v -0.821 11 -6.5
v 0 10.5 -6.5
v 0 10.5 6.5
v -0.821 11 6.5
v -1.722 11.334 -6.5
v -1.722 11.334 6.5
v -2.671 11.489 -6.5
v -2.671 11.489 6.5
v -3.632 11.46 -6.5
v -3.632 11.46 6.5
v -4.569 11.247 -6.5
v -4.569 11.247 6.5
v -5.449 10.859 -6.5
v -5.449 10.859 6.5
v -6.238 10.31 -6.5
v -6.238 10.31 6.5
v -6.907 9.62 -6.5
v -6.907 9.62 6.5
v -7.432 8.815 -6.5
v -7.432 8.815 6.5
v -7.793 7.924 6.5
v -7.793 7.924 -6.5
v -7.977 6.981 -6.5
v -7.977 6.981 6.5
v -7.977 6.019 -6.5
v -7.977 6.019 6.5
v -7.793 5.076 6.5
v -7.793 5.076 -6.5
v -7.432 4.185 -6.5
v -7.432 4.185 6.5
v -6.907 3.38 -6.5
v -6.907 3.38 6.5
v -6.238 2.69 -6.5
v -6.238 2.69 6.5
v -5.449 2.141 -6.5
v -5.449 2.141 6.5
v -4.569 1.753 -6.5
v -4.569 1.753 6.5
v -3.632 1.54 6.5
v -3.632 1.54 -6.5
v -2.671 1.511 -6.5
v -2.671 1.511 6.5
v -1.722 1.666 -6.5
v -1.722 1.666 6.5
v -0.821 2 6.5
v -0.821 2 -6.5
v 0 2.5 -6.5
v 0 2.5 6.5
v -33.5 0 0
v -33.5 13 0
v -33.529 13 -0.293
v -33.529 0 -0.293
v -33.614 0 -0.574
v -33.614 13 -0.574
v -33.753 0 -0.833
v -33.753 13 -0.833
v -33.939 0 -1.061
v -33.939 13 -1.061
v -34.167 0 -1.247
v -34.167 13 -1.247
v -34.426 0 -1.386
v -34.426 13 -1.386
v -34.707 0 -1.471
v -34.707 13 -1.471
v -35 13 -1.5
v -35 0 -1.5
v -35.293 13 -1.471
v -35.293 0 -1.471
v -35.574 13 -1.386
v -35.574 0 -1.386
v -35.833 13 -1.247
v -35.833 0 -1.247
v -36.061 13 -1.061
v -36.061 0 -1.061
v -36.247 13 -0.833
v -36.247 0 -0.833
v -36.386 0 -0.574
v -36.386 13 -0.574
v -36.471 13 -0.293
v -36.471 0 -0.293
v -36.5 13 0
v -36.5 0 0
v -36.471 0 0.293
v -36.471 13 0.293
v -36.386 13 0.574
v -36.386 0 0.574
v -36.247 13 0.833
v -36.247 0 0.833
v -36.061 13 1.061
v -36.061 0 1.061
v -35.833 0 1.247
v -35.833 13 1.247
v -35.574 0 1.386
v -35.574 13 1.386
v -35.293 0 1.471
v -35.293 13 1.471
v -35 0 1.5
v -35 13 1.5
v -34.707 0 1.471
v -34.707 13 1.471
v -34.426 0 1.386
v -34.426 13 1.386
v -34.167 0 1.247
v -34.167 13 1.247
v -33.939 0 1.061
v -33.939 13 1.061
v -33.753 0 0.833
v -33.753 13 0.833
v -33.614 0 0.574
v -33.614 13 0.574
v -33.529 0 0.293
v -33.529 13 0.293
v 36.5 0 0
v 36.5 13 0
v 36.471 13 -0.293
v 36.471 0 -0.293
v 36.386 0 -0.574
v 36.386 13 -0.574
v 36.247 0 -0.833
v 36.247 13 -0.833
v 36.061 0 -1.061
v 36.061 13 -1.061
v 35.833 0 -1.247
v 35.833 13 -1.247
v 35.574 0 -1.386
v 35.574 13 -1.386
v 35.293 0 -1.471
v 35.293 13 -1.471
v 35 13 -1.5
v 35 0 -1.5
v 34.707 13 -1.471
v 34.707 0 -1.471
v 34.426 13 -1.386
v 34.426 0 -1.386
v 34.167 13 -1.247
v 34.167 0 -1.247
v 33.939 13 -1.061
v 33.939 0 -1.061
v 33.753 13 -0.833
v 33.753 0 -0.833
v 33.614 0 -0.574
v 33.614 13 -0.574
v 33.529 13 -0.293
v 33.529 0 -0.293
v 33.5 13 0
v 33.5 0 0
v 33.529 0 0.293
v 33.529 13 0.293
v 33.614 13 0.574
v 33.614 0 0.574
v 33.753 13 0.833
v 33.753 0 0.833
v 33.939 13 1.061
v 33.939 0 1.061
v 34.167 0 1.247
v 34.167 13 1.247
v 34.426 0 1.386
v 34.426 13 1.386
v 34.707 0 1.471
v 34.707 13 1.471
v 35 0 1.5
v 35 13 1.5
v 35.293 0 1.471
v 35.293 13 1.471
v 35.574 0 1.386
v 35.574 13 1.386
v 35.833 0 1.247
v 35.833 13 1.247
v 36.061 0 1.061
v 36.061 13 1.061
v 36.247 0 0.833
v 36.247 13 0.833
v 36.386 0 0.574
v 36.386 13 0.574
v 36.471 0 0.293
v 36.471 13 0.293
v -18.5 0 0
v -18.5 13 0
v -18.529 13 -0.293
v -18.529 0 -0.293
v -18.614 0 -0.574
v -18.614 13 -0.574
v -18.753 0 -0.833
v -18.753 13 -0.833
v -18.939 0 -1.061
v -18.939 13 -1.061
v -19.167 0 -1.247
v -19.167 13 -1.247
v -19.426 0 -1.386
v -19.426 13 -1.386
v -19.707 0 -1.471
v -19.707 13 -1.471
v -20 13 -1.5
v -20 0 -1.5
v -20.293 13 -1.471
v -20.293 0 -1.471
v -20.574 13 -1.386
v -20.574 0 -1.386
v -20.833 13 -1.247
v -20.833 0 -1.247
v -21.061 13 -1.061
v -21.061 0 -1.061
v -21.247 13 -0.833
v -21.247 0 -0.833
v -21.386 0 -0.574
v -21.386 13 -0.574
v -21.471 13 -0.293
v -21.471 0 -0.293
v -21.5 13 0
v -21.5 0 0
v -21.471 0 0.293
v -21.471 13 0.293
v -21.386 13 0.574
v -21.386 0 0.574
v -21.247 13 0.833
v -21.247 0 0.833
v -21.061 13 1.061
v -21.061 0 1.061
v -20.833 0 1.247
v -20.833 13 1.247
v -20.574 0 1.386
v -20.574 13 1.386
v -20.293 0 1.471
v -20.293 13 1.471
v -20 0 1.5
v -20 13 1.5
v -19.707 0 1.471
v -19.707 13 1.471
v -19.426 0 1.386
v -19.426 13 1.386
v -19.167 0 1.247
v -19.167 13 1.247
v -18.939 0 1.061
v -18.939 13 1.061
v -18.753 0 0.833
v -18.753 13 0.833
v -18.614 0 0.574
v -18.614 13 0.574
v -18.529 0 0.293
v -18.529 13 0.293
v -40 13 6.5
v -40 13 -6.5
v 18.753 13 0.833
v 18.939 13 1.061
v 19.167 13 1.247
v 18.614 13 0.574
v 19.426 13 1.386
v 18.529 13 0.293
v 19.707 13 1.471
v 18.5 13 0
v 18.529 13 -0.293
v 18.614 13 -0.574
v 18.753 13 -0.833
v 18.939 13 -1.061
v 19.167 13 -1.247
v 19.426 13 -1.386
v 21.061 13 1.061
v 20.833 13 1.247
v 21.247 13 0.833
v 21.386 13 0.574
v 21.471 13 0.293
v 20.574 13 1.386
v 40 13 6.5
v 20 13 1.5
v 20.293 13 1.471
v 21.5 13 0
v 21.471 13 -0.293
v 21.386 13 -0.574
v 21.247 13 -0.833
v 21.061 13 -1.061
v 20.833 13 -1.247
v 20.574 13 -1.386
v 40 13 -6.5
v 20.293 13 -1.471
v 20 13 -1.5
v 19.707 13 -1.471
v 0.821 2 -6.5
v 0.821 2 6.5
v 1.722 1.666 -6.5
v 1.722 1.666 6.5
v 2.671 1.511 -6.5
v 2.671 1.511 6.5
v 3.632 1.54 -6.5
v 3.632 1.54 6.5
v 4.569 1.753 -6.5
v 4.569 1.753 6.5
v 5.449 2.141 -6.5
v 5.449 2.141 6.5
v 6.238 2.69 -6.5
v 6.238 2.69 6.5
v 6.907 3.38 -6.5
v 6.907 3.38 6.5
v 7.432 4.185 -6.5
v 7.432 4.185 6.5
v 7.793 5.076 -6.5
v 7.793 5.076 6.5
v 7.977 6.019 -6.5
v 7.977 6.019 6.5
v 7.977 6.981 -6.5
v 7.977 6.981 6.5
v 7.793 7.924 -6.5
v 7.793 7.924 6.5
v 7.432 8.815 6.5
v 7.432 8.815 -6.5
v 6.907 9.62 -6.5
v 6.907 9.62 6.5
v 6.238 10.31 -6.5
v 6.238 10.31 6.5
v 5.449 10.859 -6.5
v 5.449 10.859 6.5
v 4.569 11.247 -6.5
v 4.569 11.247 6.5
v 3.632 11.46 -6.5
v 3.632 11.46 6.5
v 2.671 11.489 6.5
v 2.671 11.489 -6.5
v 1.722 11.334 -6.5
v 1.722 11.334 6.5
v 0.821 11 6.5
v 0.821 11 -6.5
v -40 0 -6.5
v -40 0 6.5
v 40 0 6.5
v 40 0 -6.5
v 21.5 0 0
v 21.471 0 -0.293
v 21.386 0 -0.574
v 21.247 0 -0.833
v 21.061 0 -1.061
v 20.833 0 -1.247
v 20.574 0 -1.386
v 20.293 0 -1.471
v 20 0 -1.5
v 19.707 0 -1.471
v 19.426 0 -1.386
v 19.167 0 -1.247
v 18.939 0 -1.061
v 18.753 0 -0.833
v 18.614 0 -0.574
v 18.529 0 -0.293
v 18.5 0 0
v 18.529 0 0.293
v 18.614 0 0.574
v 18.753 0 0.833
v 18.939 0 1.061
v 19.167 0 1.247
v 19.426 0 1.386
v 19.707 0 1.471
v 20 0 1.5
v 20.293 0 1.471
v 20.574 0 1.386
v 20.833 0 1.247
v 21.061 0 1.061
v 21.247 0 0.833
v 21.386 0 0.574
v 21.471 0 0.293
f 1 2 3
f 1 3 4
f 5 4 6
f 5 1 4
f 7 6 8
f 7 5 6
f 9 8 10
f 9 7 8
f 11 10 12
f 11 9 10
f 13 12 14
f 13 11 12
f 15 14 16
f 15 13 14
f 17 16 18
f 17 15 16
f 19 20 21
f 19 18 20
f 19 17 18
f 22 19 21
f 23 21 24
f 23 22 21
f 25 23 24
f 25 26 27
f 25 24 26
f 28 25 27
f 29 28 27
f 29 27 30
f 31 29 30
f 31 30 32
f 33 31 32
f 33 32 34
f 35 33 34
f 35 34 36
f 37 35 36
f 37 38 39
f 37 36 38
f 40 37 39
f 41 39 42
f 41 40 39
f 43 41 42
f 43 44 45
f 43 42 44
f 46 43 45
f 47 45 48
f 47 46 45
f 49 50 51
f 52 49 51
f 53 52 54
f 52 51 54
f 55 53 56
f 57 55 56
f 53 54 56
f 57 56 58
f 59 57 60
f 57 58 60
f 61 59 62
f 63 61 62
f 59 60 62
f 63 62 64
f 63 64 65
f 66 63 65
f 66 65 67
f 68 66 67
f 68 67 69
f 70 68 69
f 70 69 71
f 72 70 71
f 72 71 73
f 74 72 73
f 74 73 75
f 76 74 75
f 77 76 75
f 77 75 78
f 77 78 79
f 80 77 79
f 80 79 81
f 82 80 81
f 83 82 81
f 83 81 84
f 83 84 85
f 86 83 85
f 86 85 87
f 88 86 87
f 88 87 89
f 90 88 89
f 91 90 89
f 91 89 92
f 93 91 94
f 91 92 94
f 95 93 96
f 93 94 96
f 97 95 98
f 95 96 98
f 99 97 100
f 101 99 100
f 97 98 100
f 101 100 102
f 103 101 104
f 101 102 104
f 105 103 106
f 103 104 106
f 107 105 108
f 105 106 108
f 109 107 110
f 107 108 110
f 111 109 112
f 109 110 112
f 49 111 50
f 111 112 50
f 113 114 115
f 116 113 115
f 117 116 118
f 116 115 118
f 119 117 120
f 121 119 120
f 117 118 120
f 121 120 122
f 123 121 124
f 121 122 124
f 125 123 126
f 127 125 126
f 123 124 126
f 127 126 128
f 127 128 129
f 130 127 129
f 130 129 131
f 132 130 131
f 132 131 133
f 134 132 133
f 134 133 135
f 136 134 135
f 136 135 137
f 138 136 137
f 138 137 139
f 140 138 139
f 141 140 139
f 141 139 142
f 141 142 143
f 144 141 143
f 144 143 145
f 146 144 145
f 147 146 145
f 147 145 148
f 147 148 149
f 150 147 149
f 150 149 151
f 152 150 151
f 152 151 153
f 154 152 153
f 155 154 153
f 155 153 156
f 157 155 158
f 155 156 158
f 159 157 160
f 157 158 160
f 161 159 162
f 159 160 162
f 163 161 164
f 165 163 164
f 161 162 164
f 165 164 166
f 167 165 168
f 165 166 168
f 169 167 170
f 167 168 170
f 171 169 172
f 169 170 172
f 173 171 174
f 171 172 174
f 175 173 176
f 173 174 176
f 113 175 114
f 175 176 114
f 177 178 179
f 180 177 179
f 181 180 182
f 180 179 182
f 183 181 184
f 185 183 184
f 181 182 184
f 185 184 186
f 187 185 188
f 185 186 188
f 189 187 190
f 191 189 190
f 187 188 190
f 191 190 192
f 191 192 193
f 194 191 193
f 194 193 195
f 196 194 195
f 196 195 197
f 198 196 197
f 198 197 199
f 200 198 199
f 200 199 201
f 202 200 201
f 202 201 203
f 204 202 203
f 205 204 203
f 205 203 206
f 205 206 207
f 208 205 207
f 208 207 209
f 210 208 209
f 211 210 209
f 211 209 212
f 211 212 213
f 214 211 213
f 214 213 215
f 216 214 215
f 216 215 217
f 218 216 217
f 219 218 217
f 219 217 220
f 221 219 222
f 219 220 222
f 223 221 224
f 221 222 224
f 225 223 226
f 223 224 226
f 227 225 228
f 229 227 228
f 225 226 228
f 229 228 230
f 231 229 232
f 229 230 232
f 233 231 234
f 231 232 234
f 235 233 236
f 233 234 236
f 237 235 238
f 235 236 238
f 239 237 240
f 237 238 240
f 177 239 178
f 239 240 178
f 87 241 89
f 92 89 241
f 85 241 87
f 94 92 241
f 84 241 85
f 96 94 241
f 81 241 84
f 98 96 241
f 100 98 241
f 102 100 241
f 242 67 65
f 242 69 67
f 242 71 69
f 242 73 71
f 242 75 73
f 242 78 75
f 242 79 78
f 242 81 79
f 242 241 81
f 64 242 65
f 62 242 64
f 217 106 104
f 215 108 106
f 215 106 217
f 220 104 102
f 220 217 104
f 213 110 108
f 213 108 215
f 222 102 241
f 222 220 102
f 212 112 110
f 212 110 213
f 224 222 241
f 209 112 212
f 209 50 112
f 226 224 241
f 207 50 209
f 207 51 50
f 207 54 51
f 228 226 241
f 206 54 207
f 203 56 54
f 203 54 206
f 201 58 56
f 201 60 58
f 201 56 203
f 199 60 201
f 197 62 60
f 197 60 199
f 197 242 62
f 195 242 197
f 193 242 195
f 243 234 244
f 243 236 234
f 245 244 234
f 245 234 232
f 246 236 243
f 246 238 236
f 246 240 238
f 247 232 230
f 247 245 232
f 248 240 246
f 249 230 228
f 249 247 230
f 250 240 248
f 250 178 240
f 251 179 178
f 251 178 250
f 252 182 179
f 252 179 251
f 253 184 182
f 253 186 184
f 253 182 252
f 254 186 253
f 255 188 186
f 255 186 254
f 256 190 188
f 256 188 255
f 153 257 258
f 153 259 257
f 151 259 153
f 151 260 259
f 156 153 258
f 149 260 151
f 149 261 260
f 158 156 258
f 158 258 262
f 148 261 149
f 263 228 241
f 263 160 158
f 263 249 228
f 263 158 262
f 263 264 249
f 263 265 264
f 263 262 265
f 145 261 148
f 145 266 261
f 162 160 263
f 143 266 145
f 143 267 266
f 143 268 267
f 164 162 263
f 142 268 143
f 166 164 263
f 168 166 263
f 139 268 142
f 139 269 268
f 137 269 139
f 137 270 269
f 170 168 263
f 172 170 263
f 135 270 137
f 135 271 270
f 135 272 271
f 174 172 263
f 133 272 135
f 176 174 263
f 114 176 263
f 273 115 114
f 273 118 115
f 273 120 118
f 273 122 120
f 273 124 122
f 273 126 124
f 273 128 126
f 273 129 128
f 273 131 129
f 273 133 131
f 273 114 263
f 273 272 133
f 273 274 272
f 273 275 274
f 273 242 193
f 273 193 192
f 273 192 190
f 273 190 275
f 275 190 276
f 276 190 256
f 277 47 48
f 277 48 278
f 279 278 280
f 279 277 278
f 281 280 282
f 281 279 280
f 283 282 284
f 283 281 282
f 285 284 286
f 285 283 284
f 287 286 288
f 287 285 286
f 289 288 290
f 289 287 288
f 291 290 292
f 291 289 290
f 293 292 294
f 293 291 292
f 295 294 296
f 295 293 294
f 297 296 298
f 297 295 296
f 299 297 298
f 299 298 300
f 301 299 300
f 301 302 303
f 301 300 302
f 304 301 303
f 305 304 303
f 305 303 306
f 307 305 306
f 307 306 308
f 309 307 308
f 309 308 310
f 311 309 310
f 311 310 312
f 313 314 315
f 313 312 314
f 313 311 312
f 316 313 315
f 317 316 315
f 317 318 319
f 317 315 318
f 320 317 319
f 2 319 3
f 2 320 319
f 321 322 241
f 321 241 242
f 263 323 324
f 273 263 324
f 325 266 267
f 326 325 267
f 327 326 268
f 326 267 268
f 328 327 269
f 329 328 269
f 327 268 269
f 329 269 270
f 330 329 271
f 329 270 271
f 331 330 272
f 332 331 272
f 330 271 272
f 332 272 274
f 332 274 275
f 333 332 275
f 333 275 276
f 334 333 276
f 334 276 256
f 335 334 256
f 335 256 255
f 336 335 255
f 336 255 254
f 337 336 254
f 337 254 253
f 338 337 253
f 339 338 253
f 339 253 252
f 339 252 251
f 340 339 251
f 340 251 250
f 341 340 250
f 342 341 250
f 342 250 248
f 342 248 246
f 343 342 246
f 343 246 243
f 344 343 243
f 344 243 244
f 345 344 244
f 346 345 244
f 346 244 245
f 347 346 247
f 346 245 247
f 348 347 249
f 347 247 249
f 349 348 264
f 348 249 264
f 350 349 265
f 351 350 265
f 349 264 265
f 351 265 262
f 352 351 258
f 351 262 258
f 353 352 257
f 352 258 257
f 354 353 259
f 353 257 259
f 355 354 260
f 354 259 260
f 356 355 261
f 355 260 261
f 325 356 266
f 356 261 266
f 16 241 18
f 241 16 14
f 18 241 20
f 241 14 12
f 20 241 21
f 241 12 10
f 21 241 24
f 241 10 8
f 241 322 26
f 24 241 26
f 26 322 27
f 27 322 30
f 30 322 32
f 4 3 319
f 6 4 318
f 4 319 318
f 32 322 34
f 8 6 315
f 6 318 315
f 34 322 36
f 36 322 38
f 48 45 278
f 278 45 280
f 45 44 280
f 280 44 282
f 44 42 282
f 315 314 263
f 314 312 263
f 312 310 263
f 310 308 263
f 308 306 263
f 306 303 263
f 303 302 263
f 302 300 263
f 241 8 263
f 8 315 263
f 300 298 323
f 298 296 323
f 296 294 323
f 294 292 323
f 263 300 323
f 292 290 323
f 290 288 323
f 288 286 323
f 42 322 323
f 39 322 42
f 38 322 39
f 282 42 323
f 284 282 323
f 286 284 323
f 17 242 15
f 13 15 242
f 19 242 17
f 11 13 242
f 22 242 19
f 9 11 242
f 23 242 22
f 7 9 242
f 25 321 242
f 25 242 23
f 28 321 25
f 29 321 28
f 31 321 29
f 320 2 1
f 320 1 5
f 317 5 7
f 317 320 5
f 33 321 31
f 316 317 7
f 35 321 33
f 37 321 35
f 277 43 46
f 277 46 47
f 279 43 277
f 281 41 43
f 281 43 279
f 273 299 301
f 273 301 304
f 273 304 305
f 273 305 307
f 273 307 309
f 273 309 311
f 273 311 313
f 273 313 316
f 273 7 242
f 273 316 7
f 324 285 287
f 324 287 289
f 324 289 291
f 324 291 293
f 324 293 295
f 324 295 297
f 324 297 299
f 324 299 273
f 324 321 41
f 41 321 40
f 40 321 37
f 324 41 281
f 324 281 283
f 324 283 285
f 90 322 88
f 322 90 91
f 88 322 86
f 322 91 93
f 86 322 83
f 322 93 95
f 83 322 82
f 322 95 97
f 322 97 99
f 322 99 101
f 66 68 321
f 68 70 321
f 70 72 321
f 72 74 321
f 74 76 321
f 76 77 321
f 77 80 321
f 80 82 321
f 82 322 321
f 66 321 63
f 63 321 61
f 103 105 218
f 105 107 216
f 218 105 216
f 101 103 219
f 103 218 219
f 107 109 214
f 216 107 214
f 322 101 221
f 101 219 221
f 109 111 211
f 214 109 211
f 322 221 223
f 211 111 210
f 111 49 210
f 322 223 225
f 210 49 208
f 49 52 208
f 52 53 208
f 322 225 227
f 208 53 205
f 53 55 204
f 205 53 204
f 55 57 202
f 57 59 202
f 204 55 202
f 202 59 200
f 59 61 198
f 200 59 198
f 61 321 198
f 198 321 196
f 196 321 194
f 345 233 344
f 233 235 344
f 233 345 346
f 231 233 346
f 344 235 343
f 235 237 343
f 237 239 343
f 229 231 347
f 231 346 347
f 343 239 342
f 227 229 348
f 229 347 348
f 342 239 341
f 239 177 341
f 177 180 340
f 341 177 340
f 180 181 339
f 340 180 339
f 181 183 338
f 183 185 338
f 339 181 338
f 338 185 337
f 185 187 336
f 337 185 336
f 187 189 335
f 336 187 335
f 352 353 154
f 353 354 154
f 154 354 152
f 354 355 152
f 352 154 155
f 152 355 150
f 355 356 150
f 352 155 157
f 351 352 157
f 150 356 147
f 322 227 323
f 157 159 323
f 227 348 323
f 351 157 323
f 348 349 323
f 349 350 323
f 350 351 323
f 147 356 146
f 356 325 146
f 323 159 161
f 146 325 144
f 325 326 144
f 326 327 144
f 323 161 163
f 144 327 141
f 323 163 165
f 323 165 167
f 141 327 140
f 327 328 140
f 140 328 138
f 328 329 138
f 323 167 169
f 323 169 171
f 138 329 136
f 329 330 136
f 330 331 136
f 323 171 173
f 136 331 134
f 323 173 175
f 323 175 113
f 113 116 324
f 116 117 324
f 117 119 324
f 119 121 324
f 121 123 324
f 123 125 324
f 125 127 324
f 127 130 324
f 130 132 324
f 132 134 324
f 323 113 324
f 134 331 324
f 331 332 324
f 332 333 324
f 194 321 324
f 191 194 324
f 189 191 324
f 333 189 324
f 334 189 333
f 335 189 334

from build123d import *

# Parameters (mm, degrees)
SKETCH1_W               = 80
SKETCH1_H               = 13
BOSS_EXTRUDE1_DEPTH     = 13
CUT_EXTRUDE1_DEPTH      = 7.5
CUT_EXTRUDE1_DEPTH_BACK = 7.5
CUT_EXTRUDE2_REACH      = 15
SKETCH4_R               = 1.5


with BuildPart() as part:
    # Sketch1 → Boss-Extrude1 (new body)
    with BuildSketch(Plane(origin=(0, 0, 0), x_dir=(1, 0, 0), z_dir=(0, 1, 0))):
        Rectangle(SKETCH1_W, SKETCH1_H)
    extrude(amount=BOSS_EXTRUDE1_DEPTH)

    # Sketch3 → Cut-Extrude1 (cut, two sides)
    with BuildSketch(Plane.XY) as cut_extrude1_sk:
        with BuildLine():
            ThreePointArc((0, 2.5), (8, 6.5), (0, 10.5))
            ThreePointArc((0, 10.5), (-8, 6.5), (0, 2.5))
        make_face()
    extrude(amount=CUT_EXTRUDE1_DEPTH, mode=Mode.SUBTRACT)
    extrude(cut_extrude1_sk.sketch, amount=-CUT_EXTRUDE1_DEPTH_BACK, mode=Mode.SUBTRACT)

    # Sketch4 → Cut-Extrude2 (cut, up to next)
    with BuildSketch(Plane(origin=(0, 13, 0), x_dir=(1, 0, 0), z_dir=(0, 1, 0)), mode=Mode.PRIVATE) as cut_extrude2_sk1:
        with Locations((-35, 0)):
            Circle(SKETCH4_R)
    cut_extrude2_tool1 = extrude(cut_extrude2_sk1.sketch, amount=-CUT_EXTRUDE2_REACH, mode=Mode.PRIVATE) & part.part
    add(cut_extrude2_tool1.solids().sort_by_distance((-35, 13, 0))[0], mode=Mode.SUBTRACT)
    # Sketch4 → Cut-Extrude2 (cut, up to next)
    with BuildSketch(Plane(origin=(0, 13, 0), x_dir=(1, 0, 0), z_dir=(0, 1, 0)), mode=Mode.PRIVATE) as cut_extrude2_sk2:
        with Locations((-20, 0)):
            Circle(SKETCH4_R)
    cut_extrude2_tool2 = extrude(cut_extrude2_sk2.sketch, amount=-CUT_EXTRUDE2_REACH, mode=Mode.PRIVATE) & part.part
    add(cut_extrude2_tool2.solids().sort_by_distance((-20, 13, 0))[0], mode=Mode.SUBTRACT)
    # Sketch4 → Cut-Extrude2 (cut, up to next)
    with BuildSketch(Plane(origin=(0, 13, 0), x_dir=(1, 0, 0), z_dir=(0, 1, 0)), mode=Mode.PRIVATE) as cut_extrude2_sk3:
        with Locations((20, 0)):
            Circle(SKETCH4_R)
    cut_extrude2_tool3 = extrude(cut_extrude2_sk3.sketch, amount=-CUT_EXTRUDE2_REACH, mode=Mode.PRIVATE) & part.part
    add(cut_extrude2_tool3.solids().sort_by_distance((20, 13, 0))[0], mode=Mode.SUBTRACT)
    # Sketch4 → Cut-Extrude2 (cut, up to next)
    with BuildSketch(Plane(origin=(0, 13, 0), x_dir=(1, 0, 0), z_dir=(0, 1, 0)), mode=Mode.PRIVATE) as cut_extrude2_sk4:
        with Locations((35, 0)):
            Circle(SKETCH4_R)
    cut_extrude2_tool4 = extrude(cut_extrude2_sk4.sketch, amount=-CUT_EXTRUDE2_REACH, mode=Mode.PRIVATE) & part.part
    add(cut_extrude2_tool4.solids().sort_by_distance((35, 13, 0))[0], mode=Mode.SUBTRACT)


solid = part.part
